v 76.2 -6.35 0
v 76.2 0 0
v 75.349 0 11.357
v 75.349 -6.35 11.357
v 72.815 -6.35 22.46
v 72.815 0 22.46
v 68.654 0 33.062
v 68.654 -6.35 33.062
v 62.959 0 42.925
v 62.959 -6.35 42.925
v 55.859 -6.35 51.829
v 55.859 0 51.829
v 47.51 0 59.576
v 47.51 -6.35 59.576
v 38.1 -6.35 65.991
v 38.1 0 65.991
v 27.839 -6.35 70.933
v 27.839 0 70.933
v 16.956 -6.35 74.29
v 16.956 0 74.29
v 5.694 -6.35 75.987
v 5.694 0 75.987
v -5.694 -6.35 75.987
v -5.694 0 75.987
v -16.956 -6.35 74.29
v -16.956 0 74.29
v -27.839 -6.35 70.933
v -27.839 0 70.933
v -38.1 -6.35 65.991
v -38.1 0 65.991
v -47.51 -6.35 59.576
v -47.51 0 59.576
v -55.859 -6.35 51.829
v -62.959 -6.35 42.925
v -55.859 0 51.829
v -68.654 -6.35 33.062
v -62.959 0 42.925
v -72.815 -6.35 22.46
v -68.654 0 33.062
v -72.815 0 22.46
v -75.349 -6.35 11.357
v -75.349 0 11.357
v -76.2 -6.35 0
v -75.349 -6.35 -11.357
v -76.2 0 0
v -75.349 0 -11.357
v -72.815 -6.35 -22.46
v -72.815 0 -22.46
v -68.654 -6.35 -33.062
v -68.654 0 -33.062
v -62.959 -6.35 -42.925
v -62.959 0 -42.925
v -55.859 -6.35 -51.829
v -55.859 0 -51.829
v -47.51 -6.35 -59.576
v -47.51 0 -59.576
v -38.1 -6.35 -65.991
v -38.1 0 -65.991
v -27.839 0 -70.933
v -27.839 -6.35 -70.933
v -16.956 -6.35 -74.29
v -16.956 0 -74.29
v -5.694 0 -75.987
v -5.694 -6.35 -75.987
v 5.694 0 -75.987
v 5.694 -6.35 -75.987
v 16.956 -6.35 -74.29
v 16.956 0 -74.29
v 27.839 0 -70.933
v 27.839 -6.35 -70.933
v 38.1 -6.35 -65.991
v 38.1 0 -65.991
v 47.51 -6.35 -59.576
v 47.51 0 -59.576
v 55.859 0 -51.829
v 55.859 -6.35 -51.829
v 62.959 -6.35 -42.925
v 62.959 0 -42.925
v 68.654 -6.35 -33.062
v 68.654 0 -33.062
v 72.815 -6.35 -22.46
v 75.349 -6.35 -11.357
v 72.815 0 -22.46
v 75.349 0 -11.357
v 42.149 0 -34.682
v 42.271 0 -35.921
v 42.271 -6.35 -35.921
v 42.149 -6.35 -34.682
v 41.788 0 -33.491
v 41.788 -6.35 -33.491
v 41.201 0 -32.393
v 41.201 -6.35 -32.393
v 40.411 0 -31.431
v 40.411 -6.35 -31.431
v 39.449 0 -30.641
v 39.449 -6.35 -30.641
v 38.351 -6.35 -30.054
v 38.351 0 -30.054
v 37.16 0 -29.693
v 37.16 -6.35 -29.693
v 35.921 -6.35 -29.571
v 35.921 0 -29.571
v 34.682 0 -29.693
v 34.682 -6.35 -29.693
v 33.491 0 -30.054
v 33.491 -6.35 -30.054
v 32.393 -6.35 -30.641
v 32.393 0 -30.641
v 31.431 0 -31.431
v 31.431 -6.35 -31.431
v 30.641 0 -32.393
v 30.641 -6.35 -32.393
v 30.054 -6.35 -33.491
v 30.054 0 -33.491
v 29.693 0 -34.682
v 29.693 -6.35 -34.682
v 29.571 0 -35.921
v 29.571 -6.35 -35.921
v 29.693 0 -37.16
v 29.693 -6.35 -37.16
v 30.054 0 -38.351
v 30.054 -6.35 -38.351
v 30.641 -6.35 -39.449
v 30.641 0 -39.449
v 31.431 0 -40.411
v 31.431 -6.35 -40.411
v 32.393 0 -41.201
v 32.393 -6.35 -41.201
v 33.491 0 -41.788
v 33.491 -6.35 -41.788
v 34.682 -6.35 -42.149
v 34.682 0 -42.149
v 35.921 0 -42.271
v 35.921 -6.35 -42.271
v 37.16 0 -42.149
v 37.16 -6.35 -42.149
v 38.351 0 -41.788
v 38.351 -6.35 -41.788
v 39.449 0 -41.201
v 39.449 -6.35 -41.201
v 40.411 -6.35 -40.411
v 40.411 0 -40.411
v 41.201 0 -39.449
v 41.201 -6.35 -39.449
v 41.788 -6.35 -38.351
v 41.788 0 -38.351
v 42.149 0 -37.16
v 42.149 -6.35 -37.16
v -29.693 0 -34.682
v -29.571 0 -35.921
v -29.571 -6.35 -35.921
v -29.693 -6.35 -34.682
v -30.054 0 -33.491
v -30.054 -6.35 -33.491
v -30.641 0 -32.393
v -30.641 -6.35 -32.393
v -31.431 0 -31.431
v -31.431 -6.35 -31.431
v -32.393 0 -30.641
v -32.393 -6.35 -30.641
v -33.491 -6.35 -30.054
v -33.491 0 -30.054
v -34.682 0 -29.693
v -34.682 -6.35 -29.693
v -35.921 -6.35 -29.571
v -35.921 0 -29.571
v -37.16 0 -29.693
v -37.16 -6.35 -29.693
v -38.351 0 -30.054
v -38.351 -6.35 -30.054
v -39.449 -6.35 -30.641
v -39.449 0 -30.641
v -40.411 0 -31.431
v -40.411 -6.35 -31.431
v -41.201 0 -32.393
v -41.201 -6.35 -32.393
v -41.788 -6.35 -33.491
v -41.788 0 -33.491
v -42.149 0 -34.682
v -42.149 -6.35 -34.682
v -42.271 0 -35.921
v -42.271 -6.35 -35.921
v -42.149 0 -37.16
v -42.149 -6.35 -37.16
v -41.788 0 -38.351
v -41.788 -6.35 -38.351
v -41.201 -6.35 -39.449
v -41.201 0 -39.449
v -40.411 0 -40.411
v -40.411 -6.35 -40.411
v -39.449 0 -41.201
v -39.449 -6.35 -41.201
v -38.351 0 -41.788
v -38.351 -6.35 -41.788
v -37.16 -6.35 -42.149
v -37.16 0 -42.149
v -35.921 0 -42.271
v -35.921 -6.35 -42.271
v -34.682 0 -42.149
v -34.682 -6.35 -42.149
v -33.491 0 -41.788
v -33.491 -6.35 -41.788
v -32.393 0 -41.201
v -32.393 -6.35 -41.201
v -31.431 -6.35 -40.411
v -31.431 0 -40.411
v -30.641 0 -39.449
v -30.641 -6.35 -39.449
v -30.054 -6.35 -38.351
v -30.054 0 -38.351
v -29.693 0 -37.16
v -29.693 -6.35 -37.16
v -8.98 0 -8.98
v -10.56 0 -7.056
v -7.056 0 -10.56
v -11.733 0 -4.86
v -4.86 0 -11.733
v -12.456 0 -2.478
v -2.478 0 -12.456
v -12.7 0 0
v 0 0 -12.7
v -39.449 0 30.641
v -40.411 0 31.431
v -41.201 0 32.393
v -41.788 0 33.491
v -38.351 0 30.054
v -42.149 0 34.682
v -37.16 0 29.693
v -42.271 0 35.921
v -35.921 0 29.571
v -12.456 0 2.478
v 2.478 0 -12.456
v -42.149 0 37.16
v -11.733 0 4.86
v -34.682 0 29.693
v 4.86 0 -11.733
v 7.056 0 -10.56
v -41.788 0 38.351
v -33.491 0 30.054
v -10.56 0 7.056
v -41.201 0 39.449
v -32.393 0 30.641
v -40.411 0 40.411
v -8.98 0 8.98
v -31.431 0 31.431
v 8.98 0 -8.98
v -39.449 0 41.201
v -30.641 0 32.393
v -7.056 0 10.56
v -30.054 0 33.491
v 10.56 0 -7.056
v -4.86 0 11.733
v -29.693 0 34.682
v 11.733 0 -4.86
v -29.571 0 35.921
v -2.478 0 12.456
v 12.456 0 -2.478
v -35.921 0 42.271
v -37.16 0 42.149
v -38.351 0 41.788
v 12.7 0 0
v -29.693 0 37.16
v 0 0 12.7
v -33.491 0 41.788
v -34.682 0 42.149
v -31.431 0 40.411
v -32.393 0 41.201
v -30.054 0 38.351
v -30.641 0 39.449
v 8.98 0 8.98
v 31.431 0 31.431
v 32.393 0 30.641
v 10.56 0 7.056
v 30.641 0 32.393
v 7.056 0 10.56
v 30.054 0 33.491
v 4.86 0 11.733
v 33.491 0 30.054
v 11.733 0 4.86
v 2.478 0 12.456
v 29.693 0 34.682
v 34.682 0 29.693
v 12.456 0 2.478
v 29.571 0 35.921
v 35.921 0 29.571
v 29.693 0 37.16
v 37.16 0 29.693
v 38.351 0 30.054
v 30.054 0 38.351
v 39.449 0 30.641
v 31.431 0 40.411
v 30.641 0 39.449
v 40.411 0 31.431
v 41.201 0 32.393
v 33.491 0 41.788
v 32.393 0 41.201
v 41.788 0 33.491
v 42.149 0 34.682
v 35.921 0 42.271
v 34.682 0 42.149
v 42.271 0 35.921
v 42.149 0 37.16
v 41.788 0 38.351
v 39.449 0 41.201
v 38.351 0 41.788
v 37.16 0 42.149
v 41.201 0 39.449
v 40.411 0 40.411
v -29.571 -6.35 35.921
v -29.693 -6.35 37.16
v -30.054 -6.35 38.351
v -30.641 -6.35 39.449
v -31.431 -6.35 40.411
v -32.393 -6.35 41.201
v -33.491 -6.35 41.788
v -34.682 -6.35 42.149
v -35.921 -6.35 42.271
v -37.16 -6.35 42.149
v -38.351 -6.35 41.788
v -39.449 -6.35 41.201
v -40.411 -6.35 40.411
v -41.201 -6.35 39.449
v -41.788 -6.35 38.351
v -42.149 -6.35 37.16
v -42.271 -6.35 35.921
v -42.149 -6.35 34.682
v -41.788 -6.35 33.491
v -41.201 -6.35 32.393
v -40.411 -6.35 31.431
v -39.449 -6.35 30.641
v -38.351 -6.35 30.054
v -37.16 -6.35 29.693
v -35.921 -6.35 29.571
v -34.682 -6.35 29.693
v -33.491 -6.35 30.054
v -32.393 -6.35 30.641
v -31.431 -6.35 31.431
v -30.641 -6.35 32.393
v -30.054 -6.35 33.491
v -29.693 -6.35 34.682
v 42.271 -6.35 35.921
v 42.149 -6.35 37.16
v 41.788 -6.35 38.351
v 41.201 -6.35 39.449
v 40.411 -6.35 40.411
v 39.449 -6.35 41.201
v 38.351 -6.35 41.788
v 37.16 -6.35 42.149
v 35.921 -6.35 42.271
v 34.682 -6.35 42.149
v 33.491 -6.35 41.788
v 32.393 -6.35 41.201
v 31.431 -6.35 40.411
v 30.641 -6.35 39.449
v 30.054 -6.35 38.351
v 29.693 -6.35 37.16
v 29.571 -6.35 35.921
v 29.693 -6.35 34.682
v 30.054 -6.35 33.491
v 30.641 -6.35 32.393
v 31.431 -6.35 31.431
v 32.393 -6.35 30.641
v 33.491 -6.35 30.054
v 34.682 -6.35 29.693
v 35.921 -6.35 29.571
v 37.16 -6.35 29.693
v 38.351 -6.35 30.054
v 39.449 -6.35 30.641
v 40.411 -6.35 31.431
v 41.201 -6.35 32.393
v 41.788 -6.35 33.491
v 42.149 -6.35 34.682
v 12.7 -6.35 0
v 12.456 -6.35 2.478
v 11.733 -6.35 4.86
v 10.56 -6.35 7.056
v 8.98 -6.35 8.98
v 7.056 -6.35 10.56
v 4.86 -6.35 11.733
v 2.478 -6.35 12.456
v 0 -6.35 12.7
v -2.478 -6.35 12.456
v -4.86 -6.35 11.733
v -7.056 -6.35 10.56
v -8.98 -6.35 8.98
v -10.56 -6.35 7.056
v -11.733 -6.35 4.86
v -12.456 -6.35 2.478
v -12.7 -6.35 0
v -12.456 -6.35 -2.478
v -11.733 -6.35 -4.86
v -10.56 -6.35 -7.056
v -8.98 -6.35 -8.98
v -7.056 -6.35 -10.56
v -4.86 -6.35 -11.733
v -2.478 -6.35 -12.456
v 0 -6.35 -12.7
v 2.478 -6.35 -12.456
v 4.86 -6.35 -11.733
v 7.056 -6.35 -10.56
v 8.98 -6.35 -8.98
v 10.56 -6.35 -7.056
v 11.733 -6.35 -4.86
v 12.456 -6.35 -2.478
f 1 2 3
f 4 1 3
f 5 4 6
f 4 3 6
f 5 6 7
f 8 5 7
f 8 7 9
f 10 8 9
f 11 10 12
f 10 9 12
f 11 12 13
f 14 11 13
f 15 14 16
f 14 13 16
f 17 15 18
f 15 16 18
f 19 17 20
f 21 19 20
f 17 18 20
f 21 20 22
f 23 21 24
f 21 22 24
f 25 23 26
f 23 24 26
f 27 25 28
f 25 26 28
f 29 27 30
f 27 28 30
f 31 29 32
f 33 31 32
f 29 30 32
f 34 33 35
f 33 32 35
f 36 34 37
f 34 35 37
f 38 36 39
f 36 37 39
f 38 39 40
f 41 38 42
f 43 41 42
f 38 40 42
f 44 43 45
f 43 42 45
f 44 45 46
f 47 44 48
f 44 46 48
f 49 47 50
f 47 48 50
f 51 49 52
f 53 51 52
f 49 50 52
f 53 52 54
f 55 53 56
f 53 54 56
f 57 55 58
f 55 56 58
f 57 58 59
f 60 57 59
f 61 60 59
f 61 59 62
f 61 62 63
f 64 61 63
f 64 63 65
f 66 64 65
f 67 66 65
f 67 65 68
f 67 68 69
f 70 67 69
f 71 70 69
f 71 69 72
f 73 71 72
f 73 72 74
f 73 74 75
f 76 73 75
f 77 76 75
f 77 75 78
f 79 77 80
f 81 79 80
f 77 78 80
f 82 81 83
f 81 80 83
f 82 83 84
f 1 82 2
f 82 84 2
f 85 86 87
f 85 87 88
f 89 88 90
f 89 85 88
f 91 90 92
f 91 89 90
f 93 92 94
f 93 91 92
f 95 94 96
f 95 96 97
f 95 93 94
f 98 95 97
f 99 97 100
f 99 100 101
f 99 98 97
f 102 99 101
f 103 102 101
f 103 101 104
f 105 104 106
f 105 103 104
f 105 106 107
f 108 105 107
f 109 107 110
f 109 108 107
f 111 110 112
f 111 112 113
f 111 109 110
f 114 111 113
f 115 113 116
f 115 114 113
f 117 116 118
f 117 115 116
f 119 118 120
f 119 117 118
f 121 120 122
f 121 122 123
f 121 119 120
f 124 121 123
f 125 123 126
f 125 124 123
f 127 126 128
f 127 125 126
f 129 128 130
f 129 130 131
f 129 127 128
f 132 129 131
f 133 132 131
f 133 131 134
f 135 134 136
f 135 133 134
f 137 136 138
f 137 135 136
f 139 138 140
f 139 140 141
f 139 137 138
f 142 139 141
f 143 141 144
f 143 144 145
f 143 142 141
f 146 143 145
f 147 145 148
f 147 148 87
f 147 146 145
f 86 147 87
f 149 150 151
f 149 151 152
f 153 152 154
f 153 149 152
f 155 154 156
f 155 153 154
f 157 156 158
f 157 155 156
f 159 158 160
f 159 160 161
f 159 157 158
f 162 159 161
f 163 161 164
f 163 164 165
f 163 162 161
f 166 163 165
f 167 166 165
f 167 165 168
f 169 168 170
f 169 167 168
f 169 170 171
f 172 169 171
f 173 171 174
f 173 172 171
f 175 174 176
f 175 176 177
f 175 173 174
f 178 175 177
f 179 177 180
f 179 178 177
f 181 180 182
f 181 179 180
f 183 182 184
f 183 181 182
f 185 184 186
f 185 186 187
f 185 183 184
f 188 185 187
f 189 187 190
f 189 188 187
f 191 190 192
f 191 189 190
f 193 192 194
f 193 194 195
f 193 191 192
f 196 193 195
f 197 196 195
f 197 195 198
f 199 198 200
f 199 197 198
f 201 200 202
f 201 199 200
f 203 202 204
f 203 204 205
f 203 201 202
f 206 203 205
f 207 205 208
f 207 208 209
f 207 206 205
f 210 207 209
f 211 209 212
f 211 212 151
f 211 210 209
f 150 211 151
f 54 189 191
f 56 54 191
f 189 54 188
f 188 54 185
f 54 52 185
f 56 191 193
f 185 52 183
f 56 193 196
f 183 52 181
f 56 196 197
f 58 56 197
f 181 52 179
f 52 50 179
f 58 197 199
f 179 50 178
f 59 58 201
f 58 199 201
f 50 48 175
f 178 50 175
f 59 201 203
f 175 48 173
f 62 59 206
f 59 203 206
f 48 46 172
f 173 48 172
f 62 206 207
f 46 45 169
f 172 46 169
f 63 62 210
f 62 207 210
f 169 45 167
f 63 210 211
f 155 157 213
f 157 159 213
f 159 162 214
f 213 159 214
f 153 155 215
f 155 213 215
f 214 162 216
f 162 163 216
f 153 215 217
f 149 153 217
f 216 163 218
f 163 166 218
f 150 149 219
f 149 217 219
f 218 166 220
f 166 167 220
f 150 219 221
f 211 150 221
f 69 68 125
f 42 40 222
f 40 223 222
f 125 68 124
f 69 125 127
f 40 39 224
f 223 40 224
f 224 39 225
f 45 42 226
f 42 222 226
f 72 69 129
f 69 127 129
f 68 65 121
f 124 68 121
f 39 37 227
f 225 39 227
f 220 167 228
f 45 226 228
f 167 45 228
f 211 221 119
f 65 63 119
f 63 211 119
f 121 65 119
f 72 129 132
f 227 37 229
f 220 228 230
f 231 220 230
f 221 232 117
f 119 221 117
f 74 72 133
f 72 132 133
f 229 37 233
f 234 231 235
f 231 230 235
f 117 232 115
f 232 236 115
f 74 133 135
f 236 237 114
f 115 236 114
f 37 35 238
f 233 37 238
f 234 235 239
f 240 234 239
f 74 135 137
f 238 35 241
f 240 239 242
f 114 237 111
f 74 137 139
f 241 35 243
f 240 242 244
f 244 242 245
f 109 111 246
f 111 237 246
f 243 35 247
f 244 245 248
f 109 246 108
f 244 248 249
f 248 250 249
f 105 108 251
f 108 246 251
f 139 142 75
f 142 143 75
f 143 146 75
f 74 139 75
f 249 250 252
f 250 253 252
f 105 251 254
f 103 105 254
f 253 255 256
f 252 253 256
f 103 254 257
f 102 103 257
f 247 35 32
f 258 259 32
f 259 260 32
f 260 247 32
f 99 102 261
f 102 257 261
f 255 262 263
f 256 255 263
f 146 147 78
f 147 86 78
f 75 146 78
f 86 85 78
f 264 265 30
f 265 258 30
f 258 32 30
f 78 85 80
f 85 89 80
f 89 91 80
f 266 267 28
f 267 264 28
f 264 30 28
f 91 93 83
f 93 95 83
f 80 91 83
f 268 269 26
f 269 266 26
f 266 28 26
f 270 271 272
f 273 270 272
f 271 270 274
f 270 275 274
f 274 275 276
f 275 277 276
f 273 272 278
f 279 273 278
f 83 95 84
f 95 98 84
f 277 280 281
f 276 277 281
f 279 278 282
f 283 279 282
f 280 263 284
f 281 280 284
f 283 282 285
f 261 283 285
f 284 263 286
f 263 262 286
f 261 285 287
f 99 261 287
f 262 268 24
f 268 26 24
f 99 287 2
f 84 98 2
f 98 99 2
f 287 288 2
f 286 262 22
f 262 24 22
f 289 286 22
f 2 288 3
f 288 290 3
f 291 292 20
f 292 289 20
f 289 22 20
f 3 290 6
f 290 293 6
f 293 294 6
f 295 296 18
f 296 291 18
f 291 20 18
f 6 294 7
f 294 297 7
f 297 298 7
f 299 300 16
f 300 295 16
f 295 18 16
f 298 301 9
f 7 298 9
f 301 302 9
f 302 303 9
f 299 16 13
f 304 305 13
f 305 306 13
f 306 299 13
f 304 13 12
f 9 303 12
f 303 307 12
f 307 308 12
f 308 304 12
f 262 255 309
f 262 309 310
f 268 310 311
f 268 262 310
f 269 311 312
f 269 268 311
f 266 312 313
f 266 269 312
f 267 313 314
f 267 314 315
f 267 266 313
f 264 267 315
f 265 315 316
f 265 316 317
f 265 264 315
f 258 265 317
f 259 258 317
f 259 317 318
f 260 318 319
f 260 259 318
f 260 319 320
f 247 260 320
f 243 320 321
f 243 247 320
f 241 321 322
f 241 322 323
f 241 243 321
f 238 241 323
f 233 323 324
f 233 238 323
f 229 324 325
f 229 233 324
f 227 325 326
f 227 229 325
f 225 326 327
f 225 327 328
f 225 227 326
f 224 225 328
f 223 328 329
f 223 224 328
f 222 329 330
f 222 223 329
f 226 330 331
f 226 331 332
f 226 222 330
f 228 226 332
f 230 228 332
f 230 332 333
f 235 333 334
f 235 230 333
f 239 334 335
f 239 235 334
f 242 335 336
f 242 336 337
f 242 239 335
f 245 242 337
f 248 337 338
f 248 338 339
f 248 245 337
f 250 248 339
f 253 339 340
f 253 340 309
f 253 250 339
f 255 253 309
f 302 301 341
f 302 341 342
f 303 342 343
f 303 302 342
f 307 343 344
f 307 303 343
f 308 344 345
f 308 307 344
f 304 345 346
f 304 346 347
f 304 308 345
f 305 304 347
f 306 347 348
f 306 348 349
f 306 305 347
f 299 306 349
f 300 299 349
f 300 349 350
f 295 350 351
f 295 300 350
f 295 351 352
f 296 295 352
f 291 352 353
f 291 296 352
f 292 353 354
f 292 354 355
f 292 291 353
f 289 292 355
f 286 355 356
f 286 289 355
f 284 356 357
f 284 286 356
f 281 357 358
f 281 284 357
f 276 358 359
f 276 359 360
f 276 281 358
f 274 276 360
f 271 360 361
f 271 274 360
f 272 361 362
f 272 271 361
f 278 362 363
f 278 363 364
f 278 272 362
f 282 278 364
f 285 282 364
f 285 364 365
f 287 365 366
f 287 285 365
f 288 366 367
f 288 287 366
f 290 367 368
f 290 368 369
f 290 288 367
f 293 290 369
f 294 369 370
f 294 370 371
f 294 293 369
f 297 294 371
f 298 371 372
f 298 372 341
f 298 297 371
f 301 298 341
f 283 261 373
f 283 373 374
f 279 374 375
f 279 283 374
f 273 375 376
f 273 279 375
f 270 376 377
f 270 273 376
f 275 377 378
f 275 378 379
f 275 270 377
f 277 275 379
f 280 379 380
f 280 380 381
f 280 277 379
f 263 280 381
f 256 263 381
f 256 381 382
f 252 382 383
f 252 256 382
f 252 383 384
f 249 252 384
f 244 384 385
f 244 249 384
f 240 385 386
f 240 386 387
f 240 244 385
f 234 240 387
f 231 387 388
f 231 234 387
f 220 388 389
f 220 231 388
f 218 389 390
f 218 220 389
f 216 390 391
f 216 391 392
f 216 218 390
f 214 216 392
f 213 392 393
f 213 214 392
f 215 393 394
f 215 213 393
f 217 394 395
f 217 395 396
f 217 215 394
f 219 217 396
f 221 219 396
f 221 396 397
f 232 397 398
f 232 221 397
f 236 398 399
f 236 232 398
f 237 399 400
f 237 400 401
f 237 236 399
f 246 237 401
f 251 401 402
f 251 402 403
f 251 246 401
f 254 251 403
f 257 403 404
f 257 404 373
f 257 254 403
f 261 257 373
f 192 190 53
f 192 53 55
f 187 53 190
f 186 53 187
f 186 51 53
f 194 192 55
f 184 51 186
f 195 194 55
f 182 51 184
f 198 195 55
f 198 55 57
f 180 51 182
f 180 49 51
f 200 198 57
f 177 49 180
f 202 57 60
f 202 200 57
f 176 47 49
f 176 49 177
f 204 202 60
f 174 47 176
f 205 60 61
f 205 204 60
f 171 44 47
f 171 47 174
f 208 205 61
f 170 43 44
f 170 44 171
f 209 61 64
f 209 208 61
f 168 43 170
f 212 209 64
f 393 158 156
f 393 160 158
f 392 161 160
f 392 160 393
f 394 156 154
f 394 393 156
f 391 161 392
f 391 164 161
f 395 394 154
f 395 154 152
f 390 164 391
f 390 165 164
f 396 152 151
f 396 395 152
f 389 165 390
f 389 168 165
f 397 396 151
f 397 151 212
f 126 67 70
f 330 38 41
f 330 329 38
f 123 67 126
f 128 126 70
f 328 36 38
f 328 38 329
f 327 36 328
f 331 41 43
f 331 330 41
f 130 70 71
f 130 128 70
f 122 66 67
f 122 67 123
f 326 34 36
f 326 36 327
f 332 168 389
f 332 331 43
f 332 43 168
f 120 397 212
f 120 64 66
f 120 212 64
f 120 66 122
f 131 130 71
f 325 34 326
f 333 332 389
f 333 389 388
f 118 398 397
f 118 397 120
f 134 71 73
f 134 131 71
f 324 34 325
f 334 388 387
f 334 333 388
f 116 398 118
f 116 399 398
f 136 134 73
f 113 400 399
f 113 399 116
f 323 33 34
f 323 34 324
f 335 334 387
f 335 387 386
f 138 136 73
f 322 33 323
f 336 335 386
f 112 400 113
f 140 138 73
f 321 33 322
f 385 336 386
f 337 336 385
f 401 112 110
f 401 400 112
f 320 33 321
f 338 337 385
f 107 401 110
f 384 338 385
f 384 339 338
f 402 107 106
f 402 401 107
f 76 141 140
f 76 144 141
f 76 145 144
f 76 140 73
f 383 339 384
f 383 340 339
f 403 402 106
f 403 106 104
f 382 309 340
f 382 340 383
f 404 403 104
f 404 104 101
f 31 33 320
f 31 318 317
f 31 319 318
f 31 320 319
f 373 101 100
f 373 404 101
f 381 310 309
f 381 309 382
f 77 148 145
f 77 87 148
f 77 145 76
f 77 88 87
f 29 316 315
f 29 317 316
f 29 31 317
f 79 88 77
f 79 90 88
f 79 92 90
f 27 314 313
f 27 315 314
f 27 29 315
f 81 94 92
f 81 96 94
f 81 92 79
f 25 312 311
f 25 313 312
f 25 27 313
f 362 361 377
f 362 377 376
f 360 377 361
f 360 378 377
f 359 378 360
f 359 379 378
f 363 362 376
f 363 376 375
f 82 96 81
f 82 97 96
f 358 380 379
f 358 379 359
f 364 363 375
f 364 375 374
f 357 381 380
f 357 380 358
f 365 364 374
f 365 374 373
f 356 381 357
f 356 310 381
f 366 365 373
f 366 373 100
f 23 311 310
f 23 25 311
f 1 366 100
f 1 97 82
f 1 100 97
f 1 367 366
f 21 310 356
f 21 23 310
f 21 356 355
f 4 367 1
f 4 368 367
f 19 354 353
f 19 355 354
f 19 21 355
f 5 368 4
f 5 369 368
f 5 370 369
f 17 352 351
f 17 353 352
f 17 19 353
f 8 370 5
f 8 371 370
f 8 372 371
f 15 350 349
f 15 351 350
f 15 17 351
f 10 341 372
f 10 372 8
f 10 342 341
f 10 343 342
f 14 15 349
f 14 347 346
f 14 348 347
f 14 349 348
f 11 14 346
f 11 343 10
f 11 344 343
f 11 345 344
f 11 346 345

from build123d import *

# Parameters (mm, degrees)
F0_R     = 76.2
F0_R_2   = 6.35
F0_R_3   = 12.7
F1_DEPTH = 6.35


with BuildPart() as f1:
    # F0 (on Front) → F1 (new body)
    with BuildSketch(Plane.XZ):
        Circle(F0_R)
        with Locations((-35.921024, -35.921024)):
            Circle(F0_R_2, mode=Mode.SUBTRACT)
        with Locations((35.921024, -35.921024)):
            Circle(F0_R_2, mode=Mode.SUBTRACT)
        with Locations((-35.921024, 35.921024)):
            Circle(F0_R_2, mode=Mode.SUBTRACT)
        Circle(F0_R_3, mode=Mode.SUBTRACT)
        with Locations((35.921024, 35.921024)):
            Circle(F0_R_2, mode=Mode.SUBTRACT)
    extrude(amount=F1_DEPTH)


solid = f1.part
